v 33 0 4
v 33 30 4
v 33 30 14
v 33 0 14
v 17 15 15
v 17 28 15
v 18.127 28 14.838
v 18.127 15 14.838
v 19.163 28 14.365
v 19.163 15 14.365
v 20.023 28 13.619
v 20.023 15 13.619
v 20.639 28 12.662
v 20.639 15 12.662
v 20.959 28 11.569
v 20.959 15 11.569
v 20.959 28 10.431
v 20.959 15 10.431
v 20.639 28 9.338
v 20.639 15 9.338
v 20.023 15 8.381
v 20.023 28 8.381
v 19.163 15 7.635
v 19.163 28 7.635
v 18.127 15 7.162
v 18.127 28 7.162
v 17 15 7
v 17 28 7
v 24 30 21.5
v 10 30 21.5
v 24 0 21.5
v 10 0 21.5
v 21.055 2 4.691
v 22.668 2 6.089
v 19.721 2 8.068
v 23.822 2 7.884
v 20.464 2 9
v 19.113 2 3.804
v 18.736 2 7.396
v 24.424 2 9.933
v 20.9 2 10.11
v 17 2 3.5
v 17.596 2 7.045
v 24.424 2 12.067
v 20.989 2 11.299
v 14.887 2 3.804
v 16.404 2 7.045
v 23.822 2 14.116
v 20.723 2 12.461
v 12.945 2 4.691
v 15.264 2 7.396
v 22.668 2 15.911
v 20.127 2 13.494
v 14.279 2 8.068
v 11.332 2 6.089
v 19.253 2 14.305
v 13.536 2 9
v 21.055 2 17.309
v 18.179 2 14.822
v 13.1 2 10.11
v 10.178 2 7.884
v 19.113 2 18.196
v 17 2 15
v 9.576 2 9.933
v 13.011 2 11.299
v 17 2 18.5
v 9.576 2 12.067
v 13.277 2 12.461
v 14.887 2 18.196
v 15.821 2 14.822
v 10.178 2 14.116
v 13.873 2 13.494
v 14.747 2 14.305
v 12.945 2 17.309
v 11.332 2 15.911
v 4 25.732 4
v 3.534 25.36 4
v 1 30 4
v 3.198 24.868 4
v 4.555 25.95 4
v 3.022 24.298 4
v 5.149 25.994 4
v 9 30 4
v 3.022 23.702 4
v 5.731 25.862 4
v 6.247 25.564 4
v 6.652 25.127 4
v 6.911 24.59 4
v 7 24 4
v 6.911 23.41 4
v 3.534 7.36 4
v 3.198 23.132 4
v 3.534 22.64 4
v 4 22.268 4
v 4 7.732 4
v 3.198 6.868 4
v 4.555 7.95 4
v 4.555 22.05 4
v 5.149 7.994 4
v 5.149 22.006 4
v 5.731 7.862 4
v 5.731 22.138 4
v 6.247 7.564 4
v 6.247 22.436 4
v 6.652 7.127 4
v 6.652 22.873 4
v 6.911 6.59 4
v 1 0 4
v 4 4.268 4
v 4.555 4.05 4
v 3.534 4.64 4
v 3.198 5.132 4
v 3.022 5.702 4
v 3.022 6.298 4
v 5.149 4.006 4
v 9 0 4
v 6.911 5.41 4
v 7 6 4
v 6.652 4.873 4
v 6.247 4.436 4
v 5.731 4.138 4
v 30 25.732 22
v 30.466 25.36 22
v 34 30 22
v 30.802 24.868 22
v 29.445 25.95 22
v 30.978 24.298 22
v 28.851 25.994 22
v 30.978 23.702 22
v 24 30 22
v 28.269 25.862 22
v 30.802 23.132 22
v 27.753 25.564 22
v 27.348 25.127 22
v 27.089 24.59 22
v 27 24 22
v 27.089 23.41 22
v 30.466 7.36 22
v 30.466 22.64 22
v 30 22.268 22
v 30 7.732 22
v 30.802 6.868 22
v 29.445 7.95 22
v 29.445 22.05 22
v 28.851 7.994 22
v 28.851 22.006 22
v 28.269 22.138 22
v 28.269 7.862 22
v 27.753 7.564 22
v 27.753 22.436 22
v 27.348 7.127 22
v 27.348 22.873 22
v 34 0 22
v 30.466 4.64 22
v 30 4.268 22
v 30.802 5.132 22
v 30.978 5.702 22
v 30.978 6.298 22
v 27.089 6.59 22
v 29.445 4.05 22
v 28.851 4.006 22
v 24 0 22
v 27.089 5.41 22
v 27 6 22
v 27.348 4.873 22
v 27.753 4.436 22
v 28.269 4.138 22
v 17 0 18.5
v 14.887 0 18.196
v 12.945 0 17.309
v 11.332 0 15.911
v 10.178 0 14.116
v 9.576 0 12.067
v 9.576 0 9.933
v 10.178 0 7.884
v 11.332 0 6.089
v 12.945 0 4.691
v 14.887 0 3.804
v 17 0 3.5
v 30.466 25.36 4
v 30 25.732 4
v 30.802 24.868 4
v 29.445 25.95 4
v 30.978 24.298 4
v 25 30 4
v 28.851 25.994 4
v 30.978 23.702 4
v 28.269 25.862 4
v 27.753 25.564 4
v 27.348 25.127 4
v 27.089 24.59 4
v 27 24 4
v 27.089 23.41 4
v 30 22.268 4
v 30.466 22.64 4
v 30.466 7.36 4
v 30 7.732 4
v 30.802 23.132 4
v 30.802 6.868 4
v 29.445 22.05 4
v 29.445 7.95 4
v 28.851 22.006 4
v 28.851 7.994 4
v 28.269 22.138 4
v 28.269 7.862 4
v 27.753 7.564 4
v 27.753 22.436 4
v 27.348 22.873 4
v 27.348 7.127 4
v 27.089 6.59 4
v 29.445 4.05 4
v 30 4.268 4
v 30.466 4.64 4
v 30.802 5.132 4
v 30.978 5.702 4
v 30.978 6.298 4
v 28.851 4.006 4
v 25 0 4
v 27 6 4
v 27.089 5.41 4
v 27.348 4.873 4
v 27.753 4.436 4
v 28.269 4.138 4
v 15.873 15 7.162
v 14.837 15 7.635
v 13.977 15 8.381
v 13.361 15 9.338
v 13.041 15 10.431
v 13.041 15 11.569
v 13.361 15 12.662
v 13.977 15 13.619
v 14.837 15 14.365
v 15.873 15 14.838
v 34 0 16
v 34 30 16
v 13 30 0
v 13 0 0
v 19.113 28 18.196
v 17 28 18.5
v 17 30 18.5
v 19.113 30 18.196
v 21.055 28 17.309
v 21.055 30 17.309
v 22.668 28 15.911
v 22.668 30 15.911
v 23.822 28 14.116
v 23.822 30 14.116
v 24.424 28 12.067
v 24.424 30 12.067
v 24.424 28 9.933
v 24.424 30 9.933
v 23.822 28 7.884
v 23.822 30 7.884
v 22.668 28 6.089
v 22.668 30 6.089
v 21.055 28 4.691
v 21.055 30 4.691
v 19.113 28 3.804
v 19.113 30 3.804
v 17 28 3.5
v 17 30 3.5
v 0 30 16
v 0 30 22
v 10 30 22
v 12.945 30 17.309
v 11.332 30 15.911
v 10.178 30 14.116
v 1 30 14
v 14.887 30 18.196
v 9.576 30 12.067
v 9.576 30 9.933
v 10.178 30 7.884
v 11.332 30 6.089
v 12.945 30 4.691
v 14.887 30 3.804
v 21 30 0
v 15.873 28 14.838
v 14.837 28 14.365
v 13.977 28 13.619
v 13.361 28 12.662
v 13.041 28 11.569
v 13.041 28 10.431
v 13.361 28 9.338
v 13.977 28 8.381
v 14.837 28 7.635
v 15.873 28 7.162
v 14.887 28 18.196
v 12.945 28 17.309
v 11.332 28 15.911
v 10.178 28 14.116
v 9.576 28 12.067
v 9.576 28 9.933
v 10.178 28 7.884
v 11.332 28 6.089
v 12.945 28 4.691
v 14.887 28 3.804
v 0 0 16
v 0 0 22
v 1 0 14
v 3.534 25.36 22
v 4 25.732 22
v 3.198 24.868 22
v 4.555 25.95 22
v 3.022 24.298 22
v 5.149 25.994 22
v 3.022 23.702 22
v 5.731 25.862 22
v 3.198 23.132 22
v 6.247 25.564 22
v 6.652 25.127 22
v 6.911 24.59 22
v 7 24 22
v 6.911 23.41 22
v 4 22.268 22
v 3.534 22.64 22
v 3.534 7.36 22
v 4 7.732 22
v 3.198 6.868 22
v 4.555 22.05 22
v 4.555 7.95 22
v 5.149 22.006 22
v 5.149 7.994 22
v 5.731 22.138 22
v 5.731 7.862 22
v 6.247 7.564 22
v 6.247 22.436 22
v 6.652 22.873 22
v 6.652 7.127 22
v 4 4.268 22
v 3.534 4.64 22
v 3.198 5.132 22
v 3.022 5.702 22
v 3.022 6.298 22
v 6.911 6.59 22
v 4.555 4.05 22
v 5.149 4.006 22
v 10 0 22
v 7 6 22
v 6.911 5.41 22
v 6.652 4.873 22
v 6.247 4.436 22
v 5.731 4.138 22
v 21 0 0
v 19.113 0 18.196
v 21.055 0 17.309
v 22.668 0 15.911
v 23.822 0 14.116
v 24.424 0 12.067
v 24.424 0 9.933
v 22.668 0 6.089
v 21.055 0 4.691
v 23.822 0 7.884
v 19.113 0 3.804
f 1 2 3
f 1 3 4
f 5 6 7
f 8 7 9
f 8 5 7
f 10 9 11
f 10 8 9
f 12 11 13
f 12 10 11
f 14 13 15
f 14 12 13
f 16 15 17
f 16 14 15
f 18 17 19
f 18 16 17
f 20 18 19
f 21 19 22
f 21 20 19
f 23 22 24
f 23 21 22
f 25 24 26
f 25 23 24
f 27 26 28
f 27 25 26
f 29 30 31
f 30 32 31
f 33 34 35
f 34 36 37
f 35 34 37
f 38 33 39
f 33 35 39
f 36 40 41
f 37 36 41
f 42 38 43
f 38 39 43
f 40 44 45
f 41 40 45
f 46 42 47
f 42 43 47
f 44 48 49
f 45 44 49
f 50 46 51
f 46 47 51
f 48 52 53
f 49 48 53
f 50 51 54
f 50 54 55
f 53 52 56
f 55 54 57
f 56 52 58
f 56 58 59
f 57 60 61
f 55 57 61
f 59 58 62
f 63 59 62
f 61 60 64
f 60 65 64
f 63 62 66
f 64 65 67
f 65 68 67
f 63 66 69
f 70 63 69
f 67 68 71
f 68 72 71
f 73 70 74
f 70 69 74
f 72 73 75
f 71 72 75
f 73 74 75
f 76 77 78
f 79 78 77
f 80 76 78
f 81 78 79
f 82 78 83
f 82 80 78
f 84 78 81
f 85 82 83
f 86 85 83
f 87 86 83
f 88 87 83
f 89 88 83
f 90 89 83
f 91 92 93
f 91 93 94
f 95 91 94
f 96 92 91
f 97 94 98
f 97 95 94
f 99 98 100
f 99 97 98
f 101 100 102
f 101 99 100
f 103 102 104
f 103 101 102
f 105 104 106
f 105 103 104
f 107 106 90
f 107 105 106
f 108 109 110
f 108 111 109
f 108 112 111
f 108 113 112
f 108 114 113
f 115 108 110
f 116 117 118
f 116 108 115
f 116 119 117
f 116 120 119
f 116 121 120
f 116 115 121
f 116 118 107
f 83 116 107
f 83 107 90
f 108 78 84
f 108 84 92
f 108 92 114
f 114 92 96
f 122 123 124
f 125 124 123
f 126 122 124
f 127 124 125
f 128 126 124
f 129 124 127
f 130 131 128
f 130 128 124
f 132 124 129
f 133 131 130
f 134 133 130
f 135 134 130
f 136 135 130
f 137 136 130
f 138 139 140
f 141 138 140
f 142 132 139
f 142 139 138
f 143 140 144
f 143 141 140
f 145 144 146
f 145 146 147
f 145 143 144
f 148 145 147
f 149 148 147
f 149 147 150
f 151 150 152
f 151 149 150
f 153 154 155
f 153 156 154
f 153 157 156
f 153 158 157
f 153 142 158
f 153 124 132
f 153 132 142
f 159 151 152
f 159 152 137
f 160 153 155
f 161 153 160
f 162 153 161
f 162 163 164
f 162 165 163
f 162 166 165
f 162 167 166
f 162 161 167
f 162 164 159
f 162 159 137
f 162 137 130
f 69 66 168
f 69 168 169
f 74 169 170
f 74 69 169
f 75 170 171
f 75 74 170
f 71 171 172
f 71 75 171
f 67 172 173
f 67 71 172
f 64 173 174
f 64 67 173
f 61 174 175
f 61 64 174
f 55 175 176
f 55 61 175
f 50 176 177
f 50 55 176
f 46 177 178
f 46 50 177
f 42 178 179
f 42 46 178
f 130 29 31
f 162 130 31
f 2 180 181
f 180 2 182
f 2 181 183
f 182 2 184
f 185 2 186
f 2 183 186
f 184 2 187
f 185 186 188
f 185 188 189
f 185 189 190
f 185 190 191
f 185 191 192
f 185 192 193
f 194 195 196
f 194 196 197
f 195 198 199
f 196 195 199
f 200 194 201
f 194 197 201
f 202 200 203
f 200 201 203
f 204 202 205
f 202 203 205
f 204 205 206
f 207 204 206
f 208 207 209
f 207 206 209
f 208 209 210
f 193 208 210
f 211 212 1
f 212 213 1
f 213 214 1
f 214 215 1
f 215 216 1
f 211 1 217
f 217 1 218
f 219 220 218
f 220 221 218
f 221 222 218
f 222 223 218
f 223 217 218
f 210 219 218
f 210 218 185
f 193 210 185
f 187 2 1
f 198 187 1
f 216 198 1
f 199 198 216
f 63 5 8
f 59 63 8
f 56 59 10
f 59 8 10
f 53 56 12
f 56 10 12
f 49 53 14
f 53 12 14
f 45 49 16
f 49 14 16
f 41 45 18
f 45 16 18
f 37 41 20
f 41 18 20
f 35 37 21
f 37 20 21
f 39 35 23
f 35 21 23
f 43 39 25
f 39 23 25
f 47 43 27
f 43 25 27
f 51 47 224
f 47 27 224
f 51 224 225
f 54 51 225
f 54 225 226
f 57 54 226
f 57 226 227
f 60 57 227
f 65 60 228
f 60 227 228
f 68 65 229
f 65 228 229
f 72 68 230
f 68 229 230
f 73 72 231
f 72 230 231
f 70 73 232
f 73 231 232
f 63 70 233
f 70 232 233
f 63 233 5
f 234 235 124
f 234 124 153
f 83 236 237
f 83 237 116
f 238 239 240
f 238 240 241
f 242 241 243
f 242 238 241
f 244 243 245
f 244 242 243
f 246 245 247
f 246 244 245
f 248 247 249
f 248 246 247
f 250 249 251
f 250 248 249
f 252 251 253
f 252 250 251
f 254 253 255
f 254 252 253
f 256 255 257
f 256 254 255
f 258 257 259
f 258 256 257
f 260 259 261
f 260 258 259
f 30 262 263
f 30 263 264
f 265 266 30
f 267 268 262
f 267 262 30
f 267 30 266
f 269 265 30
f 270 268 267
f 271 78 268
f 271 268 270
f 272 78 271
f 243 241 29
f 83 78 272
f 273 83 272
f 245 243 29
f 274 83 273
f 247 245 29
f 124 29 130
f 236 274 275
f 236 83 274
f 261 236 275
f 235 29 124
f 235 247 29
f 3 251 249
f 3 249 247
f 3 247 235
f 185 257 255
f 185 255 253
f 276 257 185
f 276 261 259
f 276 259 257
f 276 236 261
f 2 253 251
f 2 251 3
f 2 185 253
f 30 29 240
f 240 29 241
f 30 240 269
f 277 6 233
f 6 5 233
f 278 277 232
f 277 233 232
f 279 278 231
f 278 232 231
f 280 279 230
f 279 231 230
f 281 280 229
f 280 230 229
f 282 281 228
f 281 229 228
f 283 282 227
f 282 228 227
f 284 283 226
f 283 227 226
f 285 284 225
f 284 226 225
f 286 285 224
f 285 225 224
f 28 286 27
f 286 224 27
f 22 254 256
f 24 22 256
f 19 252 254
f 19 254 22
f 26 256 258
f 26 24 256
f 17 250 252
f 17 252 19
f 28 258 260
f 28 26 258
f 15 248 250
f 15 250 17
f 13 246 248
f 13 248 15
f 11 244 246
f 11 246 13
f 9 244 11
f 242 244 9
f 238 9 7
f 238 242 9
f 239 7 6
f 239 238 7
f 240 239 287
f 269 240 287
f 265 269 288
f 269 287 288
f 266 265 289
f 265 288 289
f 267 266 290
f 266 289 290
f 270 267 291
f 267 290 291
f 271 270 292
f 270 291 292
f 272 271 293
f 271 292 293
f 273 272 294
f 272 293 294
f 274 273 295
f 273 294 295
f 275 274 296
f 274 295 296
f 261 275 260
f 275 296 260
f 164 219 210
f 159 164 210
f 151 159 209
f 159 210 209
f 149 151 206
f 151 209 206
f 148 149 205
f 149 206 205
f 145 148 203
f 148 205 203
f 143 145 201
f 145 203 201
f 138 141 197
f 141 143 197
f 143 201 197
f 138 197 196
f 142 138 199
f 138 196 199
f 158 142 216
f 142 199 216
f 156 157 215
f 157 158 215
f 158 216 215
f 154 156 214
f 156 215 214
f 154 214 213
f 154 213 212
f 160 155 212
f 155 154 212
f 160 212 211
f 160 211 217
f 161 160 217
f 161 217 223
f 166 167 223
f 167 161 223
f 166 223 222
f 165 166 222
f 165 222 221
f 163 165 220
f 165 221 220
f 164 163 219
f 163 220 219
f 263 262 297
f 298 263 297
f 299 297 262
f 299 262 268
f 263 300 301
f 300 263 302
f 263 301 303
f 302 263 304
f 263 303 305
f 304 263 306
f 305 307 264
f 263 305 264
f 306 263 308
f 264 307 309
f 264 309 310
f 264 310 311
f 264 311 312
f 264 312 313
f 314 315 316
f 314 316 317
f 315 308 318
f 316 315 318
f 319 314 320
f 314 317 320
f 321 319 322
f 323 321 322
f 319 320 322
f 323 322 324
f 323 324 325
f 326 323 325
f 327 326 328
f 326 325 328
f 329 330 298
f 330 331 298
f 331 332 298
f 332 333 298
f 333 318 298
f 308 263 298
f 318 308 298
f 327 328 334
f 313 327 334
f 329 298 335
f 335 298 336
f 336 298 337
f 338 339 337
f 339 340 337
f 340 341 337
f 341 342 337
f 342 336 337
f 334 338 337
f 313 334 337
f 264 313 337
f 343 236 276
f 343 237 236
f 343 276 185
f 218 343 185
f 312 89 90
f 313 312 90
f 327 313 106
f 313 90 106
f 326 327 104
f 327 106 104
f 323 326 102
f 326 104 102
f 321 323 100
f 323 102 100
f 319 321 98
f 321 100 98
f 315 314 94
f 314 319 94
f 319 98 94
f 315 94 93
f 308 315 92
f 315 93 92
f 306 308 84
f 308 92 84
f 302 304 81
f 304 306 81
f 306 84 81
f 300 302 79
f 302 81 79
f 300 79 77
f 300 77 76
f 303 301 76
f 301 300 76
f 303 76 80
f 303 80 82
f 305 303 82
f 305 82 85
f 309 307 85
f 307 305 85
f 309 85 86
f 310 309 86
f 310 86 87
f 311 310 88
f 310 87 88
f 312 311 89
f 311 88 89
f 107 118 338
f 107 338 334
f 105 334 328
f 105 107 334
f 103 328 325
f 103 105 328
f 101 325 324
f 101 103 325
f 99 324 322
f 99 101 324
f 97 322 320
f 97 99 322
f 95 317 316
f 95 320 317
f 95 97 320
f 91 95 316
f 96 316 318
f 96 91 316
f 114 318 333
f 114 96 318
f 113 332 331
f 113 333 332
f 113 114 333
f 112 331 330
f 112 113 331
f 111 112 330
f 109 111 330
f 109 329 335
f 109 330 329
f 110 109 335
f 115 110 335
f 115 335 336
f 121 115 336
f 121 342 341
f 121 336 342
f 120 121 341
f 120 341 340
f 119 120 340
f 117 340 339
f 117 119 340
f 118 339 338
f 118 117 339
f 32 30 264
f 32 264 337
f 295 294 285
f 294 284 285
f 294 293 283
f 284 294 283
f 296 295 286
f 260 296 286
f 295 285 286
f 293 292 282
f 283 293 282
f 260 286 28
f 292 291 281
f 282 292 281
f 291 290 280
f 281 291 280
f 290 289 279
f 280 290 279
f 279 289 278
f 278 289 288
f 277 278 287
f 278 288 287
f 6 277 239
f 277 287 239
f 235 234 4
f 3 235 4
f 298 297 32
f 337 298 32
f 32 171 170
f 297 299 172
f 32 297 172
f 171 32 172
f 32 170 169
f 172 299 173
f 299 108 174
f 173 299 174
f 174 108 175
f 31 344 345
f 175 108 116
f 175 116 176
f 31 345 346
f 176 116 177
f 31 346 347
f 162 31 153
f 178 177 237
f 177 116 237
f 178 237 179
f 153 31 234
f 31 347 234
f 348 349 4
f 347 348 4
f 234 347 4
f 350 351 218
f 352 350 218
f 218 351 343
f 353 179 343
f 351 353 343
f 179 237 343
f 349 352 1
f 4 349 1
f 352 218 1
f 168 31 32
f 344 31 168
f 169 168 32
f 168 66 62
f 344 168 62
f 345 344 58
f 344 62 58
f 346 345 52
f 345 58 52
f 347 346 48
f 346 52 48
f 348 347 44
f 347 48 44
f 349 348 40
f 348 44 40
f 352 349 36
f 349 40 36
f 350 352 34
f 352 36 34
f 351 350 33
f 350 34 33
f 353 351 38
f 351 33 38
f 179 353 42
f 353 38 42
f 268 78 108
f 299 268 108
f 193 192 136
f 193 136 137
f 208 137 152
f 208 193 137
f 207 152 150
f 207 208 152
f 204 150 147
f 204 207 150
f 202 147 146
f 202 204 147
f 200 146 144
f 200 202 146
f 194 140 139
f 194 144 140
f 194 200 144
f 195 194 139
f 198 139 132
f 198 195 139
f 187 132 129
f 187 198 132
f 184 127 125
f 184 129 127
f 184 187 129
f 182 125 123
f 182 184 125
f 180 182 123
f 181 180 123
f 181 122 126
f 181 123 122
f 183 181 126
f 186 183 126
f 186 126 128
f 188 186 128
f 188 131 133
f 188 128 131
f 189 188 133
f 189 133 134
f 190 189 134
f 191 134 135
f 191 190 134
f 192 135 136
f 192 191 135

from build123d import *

# Parameters (mm, degrees)
CYLINDER002_R          = 7.5
CYLINDER002_DEPTH      = 4
CYLINDER002_ROLL_ANGLE = 90
BOX003_W               = 7
BOX003_H               = 34
BOX003_DEPTH           = 0.5
PAD001_DEPTH           = 27
BOX002_W               = 8
BOX002_H               = 22
BOX002_DEPTH           = 4
BOX001_W               = 1
BOX001_H               = 19
BOX001_DEPTH           = 14
PAD_DEPTH              = 31
CYLINDER001_R          = 2
CYLINDER001_DEPTH      = 30
CYLINDER_R             = 4
CYLINDER_DEPTH         = 40
CYLINDER_ROLL_ANGLE    = 90
BOX_W                  = 17
BOX_H                  = 15
BOX_DEPTH              = 22


with BuildPart() as cilindro002:
    # Cylinder002 → Cylinder002 (new body)
    with BuildSketch(Plane.XY):
        Circle(CYLINDER002_R)
    extrude(amount=CYLINDER002_DEPTH)


with BuildPart() as cilindro002_1:
    # Cylinder002 roll: moved
    add(cilindro002.part.rotate(Axis((0, 0, 0), (1, 0, 0)), CYLINDER002_ROLL_ANGLE))


with BuildPart() as cilindro002_2:
    # Cylinder002 placement: moved
    add(cilindro002_1.part.moved(Location((17, 2, 11))))


with BuildPart() as cubo003:
    # Box003 → Box003 (new body)
    with BuildSketch(Plane(origin=(10, 0, 21.5), x_dir=(1, 0, 0), z_dir=(0, 0, 1))):
        with Locations((3.5, 17)):
            Rectangle(BOX003_W, BOX003_H)
    extrude(amount=BOX003_DEPTH)


with BuildPart() as body001:
    # Sketch001 → Pad001 (new body)
    with BuildSketch(Plane.XZ):
        Polygon((0, 0), (4, 0), (0, 4), align=None)
    extrude(amount=PAD001_DEPTH)


with BuildPart() as body001_1:
    # Body001 placement: moved
    add(body001.part.moved(Location((9, 20, 0))))


with BuildPart() as cubo002:
    # Box002 → Box002 (new body)
    with BuildSketch(Plane(origin=(1, 0, 0), x_dir=(1, 0, 0), z_dir=(0, 0, 1))):
        with Locations((4, 11)):
            Rectangle(BOX002_W, BOX002_H)
    extrude(amount=BOX002_DEPTH)


with BuildPart() as cubo001:
    # Box001 → Box001 (new body)
    with BuildSketch(Plane.XY):
        with Locations((0.5, 9.5)):
            Rectangle(BOX001_W, BOX001_H)
    extrude(amount=BOX001_DEPTH)


with BuildPart() as body:
    # Sketch → Pad (new body)
    with BuildSketch(Plane.XZ):
        Polygon((0, 0), (-1, -8e-06), (-1, 1.999992), align=None)
    extrude(amount=PAD_DEPTH)


with BuildPart() as body_1:
    # Body placement: moved
    add(body.part.moved(Location((1, 18, 14))))


with BuildPart() as cilindro001:
    # Cylinder001 → Cylinder001 (new body)
    with BuildSketch(Plane(origin=(5, 6, -3), x_dir=(1, 0, 0), z_dir=(0, 0, 1))):
        Circle(CYLINDER001_R)
    extrude(amount=CYLINDER001_DEPTH)


with BuildPart() as cilindro:
    # Cylinder → Cylinder (new body)
    with BuildSketch(Plane.XY):
        Circle(CYLINDER_R)
    extrude(amount=CYLINDER_DEPTH)


with BuildPart() as cilindro_1:
    # Cylinder roll: moved
    add(cilindro.part.rotate(Axis((0, 0, 0), (1, 0, 0)), CYLINDER_ROLL_ANGLE))


with BuildPart() as cilindro_2:
    # Cylinder placement: moved
    add(cilindro_1.part.moved(Location((17, 35, 11))))


with BuildPart() as cut007:
    # Box → Box (new body)
    with BuildSketch(Plane.XY):
        with Locations((8.5, 7.5)):
            Rectangle(BOX_W, BOX_H)
    extrude(amount=BOX_DEPTH)

    # Cut: cut Cilindro
    add(cilindro_2.part, mode=Mode.SUBTRACT)

    # Cut001: cut Cilindro001
    add(cilindro001.part, mode=Mode.SUBTRACT)

    # Cut002: cut Body
    add(body_1.part, mode=Mode.SUBTRACT)

    # Cut003: cut Cubo001
    add(cubo001.part, mode=Mode.SUBTRACT)

    # Cut004: cut Cubo002
    add(cubo002.part, mode=Mode.SUBTRACT)

    # Cut005: cut Body001
    add(body001_1.part, mode=Mode.SUBTRACT)

    # Cut006: cut Cubo003
    add(cubo003.part, mode=Mode.SUBTRACT)

    # Cut007: cut Cilindro002
    add(cilindro002_2.part, mode=Mode.SUBTRACT)


with BuildPart() as fusion:
    # mirror: instance of Cut007
    add(cut007.part.mirror(Plane(origin=(17, 0, 0.020863), x_dir=(0, -1, 0), z_dir=(1, 0, 0))))

    # Fusion: union Cut007
    add(cut007.part)


with BuildPart() as mirror_of_fusion:
    # mirror001: instance of Fusion
    add(fusion.part.mirror(Plane(origin=(34, 15, 22), x_dir=(1, 0, 0), z_dir=(0, 1, 0))))


with BuildPart() as fusion001:
    # Fusion001 base: copy of Fusion
    add(fusion.part)

    # Fusion001: union Mirror of Fusion
    add(mirror_of_fusion.part)


solid = fusion001.part
